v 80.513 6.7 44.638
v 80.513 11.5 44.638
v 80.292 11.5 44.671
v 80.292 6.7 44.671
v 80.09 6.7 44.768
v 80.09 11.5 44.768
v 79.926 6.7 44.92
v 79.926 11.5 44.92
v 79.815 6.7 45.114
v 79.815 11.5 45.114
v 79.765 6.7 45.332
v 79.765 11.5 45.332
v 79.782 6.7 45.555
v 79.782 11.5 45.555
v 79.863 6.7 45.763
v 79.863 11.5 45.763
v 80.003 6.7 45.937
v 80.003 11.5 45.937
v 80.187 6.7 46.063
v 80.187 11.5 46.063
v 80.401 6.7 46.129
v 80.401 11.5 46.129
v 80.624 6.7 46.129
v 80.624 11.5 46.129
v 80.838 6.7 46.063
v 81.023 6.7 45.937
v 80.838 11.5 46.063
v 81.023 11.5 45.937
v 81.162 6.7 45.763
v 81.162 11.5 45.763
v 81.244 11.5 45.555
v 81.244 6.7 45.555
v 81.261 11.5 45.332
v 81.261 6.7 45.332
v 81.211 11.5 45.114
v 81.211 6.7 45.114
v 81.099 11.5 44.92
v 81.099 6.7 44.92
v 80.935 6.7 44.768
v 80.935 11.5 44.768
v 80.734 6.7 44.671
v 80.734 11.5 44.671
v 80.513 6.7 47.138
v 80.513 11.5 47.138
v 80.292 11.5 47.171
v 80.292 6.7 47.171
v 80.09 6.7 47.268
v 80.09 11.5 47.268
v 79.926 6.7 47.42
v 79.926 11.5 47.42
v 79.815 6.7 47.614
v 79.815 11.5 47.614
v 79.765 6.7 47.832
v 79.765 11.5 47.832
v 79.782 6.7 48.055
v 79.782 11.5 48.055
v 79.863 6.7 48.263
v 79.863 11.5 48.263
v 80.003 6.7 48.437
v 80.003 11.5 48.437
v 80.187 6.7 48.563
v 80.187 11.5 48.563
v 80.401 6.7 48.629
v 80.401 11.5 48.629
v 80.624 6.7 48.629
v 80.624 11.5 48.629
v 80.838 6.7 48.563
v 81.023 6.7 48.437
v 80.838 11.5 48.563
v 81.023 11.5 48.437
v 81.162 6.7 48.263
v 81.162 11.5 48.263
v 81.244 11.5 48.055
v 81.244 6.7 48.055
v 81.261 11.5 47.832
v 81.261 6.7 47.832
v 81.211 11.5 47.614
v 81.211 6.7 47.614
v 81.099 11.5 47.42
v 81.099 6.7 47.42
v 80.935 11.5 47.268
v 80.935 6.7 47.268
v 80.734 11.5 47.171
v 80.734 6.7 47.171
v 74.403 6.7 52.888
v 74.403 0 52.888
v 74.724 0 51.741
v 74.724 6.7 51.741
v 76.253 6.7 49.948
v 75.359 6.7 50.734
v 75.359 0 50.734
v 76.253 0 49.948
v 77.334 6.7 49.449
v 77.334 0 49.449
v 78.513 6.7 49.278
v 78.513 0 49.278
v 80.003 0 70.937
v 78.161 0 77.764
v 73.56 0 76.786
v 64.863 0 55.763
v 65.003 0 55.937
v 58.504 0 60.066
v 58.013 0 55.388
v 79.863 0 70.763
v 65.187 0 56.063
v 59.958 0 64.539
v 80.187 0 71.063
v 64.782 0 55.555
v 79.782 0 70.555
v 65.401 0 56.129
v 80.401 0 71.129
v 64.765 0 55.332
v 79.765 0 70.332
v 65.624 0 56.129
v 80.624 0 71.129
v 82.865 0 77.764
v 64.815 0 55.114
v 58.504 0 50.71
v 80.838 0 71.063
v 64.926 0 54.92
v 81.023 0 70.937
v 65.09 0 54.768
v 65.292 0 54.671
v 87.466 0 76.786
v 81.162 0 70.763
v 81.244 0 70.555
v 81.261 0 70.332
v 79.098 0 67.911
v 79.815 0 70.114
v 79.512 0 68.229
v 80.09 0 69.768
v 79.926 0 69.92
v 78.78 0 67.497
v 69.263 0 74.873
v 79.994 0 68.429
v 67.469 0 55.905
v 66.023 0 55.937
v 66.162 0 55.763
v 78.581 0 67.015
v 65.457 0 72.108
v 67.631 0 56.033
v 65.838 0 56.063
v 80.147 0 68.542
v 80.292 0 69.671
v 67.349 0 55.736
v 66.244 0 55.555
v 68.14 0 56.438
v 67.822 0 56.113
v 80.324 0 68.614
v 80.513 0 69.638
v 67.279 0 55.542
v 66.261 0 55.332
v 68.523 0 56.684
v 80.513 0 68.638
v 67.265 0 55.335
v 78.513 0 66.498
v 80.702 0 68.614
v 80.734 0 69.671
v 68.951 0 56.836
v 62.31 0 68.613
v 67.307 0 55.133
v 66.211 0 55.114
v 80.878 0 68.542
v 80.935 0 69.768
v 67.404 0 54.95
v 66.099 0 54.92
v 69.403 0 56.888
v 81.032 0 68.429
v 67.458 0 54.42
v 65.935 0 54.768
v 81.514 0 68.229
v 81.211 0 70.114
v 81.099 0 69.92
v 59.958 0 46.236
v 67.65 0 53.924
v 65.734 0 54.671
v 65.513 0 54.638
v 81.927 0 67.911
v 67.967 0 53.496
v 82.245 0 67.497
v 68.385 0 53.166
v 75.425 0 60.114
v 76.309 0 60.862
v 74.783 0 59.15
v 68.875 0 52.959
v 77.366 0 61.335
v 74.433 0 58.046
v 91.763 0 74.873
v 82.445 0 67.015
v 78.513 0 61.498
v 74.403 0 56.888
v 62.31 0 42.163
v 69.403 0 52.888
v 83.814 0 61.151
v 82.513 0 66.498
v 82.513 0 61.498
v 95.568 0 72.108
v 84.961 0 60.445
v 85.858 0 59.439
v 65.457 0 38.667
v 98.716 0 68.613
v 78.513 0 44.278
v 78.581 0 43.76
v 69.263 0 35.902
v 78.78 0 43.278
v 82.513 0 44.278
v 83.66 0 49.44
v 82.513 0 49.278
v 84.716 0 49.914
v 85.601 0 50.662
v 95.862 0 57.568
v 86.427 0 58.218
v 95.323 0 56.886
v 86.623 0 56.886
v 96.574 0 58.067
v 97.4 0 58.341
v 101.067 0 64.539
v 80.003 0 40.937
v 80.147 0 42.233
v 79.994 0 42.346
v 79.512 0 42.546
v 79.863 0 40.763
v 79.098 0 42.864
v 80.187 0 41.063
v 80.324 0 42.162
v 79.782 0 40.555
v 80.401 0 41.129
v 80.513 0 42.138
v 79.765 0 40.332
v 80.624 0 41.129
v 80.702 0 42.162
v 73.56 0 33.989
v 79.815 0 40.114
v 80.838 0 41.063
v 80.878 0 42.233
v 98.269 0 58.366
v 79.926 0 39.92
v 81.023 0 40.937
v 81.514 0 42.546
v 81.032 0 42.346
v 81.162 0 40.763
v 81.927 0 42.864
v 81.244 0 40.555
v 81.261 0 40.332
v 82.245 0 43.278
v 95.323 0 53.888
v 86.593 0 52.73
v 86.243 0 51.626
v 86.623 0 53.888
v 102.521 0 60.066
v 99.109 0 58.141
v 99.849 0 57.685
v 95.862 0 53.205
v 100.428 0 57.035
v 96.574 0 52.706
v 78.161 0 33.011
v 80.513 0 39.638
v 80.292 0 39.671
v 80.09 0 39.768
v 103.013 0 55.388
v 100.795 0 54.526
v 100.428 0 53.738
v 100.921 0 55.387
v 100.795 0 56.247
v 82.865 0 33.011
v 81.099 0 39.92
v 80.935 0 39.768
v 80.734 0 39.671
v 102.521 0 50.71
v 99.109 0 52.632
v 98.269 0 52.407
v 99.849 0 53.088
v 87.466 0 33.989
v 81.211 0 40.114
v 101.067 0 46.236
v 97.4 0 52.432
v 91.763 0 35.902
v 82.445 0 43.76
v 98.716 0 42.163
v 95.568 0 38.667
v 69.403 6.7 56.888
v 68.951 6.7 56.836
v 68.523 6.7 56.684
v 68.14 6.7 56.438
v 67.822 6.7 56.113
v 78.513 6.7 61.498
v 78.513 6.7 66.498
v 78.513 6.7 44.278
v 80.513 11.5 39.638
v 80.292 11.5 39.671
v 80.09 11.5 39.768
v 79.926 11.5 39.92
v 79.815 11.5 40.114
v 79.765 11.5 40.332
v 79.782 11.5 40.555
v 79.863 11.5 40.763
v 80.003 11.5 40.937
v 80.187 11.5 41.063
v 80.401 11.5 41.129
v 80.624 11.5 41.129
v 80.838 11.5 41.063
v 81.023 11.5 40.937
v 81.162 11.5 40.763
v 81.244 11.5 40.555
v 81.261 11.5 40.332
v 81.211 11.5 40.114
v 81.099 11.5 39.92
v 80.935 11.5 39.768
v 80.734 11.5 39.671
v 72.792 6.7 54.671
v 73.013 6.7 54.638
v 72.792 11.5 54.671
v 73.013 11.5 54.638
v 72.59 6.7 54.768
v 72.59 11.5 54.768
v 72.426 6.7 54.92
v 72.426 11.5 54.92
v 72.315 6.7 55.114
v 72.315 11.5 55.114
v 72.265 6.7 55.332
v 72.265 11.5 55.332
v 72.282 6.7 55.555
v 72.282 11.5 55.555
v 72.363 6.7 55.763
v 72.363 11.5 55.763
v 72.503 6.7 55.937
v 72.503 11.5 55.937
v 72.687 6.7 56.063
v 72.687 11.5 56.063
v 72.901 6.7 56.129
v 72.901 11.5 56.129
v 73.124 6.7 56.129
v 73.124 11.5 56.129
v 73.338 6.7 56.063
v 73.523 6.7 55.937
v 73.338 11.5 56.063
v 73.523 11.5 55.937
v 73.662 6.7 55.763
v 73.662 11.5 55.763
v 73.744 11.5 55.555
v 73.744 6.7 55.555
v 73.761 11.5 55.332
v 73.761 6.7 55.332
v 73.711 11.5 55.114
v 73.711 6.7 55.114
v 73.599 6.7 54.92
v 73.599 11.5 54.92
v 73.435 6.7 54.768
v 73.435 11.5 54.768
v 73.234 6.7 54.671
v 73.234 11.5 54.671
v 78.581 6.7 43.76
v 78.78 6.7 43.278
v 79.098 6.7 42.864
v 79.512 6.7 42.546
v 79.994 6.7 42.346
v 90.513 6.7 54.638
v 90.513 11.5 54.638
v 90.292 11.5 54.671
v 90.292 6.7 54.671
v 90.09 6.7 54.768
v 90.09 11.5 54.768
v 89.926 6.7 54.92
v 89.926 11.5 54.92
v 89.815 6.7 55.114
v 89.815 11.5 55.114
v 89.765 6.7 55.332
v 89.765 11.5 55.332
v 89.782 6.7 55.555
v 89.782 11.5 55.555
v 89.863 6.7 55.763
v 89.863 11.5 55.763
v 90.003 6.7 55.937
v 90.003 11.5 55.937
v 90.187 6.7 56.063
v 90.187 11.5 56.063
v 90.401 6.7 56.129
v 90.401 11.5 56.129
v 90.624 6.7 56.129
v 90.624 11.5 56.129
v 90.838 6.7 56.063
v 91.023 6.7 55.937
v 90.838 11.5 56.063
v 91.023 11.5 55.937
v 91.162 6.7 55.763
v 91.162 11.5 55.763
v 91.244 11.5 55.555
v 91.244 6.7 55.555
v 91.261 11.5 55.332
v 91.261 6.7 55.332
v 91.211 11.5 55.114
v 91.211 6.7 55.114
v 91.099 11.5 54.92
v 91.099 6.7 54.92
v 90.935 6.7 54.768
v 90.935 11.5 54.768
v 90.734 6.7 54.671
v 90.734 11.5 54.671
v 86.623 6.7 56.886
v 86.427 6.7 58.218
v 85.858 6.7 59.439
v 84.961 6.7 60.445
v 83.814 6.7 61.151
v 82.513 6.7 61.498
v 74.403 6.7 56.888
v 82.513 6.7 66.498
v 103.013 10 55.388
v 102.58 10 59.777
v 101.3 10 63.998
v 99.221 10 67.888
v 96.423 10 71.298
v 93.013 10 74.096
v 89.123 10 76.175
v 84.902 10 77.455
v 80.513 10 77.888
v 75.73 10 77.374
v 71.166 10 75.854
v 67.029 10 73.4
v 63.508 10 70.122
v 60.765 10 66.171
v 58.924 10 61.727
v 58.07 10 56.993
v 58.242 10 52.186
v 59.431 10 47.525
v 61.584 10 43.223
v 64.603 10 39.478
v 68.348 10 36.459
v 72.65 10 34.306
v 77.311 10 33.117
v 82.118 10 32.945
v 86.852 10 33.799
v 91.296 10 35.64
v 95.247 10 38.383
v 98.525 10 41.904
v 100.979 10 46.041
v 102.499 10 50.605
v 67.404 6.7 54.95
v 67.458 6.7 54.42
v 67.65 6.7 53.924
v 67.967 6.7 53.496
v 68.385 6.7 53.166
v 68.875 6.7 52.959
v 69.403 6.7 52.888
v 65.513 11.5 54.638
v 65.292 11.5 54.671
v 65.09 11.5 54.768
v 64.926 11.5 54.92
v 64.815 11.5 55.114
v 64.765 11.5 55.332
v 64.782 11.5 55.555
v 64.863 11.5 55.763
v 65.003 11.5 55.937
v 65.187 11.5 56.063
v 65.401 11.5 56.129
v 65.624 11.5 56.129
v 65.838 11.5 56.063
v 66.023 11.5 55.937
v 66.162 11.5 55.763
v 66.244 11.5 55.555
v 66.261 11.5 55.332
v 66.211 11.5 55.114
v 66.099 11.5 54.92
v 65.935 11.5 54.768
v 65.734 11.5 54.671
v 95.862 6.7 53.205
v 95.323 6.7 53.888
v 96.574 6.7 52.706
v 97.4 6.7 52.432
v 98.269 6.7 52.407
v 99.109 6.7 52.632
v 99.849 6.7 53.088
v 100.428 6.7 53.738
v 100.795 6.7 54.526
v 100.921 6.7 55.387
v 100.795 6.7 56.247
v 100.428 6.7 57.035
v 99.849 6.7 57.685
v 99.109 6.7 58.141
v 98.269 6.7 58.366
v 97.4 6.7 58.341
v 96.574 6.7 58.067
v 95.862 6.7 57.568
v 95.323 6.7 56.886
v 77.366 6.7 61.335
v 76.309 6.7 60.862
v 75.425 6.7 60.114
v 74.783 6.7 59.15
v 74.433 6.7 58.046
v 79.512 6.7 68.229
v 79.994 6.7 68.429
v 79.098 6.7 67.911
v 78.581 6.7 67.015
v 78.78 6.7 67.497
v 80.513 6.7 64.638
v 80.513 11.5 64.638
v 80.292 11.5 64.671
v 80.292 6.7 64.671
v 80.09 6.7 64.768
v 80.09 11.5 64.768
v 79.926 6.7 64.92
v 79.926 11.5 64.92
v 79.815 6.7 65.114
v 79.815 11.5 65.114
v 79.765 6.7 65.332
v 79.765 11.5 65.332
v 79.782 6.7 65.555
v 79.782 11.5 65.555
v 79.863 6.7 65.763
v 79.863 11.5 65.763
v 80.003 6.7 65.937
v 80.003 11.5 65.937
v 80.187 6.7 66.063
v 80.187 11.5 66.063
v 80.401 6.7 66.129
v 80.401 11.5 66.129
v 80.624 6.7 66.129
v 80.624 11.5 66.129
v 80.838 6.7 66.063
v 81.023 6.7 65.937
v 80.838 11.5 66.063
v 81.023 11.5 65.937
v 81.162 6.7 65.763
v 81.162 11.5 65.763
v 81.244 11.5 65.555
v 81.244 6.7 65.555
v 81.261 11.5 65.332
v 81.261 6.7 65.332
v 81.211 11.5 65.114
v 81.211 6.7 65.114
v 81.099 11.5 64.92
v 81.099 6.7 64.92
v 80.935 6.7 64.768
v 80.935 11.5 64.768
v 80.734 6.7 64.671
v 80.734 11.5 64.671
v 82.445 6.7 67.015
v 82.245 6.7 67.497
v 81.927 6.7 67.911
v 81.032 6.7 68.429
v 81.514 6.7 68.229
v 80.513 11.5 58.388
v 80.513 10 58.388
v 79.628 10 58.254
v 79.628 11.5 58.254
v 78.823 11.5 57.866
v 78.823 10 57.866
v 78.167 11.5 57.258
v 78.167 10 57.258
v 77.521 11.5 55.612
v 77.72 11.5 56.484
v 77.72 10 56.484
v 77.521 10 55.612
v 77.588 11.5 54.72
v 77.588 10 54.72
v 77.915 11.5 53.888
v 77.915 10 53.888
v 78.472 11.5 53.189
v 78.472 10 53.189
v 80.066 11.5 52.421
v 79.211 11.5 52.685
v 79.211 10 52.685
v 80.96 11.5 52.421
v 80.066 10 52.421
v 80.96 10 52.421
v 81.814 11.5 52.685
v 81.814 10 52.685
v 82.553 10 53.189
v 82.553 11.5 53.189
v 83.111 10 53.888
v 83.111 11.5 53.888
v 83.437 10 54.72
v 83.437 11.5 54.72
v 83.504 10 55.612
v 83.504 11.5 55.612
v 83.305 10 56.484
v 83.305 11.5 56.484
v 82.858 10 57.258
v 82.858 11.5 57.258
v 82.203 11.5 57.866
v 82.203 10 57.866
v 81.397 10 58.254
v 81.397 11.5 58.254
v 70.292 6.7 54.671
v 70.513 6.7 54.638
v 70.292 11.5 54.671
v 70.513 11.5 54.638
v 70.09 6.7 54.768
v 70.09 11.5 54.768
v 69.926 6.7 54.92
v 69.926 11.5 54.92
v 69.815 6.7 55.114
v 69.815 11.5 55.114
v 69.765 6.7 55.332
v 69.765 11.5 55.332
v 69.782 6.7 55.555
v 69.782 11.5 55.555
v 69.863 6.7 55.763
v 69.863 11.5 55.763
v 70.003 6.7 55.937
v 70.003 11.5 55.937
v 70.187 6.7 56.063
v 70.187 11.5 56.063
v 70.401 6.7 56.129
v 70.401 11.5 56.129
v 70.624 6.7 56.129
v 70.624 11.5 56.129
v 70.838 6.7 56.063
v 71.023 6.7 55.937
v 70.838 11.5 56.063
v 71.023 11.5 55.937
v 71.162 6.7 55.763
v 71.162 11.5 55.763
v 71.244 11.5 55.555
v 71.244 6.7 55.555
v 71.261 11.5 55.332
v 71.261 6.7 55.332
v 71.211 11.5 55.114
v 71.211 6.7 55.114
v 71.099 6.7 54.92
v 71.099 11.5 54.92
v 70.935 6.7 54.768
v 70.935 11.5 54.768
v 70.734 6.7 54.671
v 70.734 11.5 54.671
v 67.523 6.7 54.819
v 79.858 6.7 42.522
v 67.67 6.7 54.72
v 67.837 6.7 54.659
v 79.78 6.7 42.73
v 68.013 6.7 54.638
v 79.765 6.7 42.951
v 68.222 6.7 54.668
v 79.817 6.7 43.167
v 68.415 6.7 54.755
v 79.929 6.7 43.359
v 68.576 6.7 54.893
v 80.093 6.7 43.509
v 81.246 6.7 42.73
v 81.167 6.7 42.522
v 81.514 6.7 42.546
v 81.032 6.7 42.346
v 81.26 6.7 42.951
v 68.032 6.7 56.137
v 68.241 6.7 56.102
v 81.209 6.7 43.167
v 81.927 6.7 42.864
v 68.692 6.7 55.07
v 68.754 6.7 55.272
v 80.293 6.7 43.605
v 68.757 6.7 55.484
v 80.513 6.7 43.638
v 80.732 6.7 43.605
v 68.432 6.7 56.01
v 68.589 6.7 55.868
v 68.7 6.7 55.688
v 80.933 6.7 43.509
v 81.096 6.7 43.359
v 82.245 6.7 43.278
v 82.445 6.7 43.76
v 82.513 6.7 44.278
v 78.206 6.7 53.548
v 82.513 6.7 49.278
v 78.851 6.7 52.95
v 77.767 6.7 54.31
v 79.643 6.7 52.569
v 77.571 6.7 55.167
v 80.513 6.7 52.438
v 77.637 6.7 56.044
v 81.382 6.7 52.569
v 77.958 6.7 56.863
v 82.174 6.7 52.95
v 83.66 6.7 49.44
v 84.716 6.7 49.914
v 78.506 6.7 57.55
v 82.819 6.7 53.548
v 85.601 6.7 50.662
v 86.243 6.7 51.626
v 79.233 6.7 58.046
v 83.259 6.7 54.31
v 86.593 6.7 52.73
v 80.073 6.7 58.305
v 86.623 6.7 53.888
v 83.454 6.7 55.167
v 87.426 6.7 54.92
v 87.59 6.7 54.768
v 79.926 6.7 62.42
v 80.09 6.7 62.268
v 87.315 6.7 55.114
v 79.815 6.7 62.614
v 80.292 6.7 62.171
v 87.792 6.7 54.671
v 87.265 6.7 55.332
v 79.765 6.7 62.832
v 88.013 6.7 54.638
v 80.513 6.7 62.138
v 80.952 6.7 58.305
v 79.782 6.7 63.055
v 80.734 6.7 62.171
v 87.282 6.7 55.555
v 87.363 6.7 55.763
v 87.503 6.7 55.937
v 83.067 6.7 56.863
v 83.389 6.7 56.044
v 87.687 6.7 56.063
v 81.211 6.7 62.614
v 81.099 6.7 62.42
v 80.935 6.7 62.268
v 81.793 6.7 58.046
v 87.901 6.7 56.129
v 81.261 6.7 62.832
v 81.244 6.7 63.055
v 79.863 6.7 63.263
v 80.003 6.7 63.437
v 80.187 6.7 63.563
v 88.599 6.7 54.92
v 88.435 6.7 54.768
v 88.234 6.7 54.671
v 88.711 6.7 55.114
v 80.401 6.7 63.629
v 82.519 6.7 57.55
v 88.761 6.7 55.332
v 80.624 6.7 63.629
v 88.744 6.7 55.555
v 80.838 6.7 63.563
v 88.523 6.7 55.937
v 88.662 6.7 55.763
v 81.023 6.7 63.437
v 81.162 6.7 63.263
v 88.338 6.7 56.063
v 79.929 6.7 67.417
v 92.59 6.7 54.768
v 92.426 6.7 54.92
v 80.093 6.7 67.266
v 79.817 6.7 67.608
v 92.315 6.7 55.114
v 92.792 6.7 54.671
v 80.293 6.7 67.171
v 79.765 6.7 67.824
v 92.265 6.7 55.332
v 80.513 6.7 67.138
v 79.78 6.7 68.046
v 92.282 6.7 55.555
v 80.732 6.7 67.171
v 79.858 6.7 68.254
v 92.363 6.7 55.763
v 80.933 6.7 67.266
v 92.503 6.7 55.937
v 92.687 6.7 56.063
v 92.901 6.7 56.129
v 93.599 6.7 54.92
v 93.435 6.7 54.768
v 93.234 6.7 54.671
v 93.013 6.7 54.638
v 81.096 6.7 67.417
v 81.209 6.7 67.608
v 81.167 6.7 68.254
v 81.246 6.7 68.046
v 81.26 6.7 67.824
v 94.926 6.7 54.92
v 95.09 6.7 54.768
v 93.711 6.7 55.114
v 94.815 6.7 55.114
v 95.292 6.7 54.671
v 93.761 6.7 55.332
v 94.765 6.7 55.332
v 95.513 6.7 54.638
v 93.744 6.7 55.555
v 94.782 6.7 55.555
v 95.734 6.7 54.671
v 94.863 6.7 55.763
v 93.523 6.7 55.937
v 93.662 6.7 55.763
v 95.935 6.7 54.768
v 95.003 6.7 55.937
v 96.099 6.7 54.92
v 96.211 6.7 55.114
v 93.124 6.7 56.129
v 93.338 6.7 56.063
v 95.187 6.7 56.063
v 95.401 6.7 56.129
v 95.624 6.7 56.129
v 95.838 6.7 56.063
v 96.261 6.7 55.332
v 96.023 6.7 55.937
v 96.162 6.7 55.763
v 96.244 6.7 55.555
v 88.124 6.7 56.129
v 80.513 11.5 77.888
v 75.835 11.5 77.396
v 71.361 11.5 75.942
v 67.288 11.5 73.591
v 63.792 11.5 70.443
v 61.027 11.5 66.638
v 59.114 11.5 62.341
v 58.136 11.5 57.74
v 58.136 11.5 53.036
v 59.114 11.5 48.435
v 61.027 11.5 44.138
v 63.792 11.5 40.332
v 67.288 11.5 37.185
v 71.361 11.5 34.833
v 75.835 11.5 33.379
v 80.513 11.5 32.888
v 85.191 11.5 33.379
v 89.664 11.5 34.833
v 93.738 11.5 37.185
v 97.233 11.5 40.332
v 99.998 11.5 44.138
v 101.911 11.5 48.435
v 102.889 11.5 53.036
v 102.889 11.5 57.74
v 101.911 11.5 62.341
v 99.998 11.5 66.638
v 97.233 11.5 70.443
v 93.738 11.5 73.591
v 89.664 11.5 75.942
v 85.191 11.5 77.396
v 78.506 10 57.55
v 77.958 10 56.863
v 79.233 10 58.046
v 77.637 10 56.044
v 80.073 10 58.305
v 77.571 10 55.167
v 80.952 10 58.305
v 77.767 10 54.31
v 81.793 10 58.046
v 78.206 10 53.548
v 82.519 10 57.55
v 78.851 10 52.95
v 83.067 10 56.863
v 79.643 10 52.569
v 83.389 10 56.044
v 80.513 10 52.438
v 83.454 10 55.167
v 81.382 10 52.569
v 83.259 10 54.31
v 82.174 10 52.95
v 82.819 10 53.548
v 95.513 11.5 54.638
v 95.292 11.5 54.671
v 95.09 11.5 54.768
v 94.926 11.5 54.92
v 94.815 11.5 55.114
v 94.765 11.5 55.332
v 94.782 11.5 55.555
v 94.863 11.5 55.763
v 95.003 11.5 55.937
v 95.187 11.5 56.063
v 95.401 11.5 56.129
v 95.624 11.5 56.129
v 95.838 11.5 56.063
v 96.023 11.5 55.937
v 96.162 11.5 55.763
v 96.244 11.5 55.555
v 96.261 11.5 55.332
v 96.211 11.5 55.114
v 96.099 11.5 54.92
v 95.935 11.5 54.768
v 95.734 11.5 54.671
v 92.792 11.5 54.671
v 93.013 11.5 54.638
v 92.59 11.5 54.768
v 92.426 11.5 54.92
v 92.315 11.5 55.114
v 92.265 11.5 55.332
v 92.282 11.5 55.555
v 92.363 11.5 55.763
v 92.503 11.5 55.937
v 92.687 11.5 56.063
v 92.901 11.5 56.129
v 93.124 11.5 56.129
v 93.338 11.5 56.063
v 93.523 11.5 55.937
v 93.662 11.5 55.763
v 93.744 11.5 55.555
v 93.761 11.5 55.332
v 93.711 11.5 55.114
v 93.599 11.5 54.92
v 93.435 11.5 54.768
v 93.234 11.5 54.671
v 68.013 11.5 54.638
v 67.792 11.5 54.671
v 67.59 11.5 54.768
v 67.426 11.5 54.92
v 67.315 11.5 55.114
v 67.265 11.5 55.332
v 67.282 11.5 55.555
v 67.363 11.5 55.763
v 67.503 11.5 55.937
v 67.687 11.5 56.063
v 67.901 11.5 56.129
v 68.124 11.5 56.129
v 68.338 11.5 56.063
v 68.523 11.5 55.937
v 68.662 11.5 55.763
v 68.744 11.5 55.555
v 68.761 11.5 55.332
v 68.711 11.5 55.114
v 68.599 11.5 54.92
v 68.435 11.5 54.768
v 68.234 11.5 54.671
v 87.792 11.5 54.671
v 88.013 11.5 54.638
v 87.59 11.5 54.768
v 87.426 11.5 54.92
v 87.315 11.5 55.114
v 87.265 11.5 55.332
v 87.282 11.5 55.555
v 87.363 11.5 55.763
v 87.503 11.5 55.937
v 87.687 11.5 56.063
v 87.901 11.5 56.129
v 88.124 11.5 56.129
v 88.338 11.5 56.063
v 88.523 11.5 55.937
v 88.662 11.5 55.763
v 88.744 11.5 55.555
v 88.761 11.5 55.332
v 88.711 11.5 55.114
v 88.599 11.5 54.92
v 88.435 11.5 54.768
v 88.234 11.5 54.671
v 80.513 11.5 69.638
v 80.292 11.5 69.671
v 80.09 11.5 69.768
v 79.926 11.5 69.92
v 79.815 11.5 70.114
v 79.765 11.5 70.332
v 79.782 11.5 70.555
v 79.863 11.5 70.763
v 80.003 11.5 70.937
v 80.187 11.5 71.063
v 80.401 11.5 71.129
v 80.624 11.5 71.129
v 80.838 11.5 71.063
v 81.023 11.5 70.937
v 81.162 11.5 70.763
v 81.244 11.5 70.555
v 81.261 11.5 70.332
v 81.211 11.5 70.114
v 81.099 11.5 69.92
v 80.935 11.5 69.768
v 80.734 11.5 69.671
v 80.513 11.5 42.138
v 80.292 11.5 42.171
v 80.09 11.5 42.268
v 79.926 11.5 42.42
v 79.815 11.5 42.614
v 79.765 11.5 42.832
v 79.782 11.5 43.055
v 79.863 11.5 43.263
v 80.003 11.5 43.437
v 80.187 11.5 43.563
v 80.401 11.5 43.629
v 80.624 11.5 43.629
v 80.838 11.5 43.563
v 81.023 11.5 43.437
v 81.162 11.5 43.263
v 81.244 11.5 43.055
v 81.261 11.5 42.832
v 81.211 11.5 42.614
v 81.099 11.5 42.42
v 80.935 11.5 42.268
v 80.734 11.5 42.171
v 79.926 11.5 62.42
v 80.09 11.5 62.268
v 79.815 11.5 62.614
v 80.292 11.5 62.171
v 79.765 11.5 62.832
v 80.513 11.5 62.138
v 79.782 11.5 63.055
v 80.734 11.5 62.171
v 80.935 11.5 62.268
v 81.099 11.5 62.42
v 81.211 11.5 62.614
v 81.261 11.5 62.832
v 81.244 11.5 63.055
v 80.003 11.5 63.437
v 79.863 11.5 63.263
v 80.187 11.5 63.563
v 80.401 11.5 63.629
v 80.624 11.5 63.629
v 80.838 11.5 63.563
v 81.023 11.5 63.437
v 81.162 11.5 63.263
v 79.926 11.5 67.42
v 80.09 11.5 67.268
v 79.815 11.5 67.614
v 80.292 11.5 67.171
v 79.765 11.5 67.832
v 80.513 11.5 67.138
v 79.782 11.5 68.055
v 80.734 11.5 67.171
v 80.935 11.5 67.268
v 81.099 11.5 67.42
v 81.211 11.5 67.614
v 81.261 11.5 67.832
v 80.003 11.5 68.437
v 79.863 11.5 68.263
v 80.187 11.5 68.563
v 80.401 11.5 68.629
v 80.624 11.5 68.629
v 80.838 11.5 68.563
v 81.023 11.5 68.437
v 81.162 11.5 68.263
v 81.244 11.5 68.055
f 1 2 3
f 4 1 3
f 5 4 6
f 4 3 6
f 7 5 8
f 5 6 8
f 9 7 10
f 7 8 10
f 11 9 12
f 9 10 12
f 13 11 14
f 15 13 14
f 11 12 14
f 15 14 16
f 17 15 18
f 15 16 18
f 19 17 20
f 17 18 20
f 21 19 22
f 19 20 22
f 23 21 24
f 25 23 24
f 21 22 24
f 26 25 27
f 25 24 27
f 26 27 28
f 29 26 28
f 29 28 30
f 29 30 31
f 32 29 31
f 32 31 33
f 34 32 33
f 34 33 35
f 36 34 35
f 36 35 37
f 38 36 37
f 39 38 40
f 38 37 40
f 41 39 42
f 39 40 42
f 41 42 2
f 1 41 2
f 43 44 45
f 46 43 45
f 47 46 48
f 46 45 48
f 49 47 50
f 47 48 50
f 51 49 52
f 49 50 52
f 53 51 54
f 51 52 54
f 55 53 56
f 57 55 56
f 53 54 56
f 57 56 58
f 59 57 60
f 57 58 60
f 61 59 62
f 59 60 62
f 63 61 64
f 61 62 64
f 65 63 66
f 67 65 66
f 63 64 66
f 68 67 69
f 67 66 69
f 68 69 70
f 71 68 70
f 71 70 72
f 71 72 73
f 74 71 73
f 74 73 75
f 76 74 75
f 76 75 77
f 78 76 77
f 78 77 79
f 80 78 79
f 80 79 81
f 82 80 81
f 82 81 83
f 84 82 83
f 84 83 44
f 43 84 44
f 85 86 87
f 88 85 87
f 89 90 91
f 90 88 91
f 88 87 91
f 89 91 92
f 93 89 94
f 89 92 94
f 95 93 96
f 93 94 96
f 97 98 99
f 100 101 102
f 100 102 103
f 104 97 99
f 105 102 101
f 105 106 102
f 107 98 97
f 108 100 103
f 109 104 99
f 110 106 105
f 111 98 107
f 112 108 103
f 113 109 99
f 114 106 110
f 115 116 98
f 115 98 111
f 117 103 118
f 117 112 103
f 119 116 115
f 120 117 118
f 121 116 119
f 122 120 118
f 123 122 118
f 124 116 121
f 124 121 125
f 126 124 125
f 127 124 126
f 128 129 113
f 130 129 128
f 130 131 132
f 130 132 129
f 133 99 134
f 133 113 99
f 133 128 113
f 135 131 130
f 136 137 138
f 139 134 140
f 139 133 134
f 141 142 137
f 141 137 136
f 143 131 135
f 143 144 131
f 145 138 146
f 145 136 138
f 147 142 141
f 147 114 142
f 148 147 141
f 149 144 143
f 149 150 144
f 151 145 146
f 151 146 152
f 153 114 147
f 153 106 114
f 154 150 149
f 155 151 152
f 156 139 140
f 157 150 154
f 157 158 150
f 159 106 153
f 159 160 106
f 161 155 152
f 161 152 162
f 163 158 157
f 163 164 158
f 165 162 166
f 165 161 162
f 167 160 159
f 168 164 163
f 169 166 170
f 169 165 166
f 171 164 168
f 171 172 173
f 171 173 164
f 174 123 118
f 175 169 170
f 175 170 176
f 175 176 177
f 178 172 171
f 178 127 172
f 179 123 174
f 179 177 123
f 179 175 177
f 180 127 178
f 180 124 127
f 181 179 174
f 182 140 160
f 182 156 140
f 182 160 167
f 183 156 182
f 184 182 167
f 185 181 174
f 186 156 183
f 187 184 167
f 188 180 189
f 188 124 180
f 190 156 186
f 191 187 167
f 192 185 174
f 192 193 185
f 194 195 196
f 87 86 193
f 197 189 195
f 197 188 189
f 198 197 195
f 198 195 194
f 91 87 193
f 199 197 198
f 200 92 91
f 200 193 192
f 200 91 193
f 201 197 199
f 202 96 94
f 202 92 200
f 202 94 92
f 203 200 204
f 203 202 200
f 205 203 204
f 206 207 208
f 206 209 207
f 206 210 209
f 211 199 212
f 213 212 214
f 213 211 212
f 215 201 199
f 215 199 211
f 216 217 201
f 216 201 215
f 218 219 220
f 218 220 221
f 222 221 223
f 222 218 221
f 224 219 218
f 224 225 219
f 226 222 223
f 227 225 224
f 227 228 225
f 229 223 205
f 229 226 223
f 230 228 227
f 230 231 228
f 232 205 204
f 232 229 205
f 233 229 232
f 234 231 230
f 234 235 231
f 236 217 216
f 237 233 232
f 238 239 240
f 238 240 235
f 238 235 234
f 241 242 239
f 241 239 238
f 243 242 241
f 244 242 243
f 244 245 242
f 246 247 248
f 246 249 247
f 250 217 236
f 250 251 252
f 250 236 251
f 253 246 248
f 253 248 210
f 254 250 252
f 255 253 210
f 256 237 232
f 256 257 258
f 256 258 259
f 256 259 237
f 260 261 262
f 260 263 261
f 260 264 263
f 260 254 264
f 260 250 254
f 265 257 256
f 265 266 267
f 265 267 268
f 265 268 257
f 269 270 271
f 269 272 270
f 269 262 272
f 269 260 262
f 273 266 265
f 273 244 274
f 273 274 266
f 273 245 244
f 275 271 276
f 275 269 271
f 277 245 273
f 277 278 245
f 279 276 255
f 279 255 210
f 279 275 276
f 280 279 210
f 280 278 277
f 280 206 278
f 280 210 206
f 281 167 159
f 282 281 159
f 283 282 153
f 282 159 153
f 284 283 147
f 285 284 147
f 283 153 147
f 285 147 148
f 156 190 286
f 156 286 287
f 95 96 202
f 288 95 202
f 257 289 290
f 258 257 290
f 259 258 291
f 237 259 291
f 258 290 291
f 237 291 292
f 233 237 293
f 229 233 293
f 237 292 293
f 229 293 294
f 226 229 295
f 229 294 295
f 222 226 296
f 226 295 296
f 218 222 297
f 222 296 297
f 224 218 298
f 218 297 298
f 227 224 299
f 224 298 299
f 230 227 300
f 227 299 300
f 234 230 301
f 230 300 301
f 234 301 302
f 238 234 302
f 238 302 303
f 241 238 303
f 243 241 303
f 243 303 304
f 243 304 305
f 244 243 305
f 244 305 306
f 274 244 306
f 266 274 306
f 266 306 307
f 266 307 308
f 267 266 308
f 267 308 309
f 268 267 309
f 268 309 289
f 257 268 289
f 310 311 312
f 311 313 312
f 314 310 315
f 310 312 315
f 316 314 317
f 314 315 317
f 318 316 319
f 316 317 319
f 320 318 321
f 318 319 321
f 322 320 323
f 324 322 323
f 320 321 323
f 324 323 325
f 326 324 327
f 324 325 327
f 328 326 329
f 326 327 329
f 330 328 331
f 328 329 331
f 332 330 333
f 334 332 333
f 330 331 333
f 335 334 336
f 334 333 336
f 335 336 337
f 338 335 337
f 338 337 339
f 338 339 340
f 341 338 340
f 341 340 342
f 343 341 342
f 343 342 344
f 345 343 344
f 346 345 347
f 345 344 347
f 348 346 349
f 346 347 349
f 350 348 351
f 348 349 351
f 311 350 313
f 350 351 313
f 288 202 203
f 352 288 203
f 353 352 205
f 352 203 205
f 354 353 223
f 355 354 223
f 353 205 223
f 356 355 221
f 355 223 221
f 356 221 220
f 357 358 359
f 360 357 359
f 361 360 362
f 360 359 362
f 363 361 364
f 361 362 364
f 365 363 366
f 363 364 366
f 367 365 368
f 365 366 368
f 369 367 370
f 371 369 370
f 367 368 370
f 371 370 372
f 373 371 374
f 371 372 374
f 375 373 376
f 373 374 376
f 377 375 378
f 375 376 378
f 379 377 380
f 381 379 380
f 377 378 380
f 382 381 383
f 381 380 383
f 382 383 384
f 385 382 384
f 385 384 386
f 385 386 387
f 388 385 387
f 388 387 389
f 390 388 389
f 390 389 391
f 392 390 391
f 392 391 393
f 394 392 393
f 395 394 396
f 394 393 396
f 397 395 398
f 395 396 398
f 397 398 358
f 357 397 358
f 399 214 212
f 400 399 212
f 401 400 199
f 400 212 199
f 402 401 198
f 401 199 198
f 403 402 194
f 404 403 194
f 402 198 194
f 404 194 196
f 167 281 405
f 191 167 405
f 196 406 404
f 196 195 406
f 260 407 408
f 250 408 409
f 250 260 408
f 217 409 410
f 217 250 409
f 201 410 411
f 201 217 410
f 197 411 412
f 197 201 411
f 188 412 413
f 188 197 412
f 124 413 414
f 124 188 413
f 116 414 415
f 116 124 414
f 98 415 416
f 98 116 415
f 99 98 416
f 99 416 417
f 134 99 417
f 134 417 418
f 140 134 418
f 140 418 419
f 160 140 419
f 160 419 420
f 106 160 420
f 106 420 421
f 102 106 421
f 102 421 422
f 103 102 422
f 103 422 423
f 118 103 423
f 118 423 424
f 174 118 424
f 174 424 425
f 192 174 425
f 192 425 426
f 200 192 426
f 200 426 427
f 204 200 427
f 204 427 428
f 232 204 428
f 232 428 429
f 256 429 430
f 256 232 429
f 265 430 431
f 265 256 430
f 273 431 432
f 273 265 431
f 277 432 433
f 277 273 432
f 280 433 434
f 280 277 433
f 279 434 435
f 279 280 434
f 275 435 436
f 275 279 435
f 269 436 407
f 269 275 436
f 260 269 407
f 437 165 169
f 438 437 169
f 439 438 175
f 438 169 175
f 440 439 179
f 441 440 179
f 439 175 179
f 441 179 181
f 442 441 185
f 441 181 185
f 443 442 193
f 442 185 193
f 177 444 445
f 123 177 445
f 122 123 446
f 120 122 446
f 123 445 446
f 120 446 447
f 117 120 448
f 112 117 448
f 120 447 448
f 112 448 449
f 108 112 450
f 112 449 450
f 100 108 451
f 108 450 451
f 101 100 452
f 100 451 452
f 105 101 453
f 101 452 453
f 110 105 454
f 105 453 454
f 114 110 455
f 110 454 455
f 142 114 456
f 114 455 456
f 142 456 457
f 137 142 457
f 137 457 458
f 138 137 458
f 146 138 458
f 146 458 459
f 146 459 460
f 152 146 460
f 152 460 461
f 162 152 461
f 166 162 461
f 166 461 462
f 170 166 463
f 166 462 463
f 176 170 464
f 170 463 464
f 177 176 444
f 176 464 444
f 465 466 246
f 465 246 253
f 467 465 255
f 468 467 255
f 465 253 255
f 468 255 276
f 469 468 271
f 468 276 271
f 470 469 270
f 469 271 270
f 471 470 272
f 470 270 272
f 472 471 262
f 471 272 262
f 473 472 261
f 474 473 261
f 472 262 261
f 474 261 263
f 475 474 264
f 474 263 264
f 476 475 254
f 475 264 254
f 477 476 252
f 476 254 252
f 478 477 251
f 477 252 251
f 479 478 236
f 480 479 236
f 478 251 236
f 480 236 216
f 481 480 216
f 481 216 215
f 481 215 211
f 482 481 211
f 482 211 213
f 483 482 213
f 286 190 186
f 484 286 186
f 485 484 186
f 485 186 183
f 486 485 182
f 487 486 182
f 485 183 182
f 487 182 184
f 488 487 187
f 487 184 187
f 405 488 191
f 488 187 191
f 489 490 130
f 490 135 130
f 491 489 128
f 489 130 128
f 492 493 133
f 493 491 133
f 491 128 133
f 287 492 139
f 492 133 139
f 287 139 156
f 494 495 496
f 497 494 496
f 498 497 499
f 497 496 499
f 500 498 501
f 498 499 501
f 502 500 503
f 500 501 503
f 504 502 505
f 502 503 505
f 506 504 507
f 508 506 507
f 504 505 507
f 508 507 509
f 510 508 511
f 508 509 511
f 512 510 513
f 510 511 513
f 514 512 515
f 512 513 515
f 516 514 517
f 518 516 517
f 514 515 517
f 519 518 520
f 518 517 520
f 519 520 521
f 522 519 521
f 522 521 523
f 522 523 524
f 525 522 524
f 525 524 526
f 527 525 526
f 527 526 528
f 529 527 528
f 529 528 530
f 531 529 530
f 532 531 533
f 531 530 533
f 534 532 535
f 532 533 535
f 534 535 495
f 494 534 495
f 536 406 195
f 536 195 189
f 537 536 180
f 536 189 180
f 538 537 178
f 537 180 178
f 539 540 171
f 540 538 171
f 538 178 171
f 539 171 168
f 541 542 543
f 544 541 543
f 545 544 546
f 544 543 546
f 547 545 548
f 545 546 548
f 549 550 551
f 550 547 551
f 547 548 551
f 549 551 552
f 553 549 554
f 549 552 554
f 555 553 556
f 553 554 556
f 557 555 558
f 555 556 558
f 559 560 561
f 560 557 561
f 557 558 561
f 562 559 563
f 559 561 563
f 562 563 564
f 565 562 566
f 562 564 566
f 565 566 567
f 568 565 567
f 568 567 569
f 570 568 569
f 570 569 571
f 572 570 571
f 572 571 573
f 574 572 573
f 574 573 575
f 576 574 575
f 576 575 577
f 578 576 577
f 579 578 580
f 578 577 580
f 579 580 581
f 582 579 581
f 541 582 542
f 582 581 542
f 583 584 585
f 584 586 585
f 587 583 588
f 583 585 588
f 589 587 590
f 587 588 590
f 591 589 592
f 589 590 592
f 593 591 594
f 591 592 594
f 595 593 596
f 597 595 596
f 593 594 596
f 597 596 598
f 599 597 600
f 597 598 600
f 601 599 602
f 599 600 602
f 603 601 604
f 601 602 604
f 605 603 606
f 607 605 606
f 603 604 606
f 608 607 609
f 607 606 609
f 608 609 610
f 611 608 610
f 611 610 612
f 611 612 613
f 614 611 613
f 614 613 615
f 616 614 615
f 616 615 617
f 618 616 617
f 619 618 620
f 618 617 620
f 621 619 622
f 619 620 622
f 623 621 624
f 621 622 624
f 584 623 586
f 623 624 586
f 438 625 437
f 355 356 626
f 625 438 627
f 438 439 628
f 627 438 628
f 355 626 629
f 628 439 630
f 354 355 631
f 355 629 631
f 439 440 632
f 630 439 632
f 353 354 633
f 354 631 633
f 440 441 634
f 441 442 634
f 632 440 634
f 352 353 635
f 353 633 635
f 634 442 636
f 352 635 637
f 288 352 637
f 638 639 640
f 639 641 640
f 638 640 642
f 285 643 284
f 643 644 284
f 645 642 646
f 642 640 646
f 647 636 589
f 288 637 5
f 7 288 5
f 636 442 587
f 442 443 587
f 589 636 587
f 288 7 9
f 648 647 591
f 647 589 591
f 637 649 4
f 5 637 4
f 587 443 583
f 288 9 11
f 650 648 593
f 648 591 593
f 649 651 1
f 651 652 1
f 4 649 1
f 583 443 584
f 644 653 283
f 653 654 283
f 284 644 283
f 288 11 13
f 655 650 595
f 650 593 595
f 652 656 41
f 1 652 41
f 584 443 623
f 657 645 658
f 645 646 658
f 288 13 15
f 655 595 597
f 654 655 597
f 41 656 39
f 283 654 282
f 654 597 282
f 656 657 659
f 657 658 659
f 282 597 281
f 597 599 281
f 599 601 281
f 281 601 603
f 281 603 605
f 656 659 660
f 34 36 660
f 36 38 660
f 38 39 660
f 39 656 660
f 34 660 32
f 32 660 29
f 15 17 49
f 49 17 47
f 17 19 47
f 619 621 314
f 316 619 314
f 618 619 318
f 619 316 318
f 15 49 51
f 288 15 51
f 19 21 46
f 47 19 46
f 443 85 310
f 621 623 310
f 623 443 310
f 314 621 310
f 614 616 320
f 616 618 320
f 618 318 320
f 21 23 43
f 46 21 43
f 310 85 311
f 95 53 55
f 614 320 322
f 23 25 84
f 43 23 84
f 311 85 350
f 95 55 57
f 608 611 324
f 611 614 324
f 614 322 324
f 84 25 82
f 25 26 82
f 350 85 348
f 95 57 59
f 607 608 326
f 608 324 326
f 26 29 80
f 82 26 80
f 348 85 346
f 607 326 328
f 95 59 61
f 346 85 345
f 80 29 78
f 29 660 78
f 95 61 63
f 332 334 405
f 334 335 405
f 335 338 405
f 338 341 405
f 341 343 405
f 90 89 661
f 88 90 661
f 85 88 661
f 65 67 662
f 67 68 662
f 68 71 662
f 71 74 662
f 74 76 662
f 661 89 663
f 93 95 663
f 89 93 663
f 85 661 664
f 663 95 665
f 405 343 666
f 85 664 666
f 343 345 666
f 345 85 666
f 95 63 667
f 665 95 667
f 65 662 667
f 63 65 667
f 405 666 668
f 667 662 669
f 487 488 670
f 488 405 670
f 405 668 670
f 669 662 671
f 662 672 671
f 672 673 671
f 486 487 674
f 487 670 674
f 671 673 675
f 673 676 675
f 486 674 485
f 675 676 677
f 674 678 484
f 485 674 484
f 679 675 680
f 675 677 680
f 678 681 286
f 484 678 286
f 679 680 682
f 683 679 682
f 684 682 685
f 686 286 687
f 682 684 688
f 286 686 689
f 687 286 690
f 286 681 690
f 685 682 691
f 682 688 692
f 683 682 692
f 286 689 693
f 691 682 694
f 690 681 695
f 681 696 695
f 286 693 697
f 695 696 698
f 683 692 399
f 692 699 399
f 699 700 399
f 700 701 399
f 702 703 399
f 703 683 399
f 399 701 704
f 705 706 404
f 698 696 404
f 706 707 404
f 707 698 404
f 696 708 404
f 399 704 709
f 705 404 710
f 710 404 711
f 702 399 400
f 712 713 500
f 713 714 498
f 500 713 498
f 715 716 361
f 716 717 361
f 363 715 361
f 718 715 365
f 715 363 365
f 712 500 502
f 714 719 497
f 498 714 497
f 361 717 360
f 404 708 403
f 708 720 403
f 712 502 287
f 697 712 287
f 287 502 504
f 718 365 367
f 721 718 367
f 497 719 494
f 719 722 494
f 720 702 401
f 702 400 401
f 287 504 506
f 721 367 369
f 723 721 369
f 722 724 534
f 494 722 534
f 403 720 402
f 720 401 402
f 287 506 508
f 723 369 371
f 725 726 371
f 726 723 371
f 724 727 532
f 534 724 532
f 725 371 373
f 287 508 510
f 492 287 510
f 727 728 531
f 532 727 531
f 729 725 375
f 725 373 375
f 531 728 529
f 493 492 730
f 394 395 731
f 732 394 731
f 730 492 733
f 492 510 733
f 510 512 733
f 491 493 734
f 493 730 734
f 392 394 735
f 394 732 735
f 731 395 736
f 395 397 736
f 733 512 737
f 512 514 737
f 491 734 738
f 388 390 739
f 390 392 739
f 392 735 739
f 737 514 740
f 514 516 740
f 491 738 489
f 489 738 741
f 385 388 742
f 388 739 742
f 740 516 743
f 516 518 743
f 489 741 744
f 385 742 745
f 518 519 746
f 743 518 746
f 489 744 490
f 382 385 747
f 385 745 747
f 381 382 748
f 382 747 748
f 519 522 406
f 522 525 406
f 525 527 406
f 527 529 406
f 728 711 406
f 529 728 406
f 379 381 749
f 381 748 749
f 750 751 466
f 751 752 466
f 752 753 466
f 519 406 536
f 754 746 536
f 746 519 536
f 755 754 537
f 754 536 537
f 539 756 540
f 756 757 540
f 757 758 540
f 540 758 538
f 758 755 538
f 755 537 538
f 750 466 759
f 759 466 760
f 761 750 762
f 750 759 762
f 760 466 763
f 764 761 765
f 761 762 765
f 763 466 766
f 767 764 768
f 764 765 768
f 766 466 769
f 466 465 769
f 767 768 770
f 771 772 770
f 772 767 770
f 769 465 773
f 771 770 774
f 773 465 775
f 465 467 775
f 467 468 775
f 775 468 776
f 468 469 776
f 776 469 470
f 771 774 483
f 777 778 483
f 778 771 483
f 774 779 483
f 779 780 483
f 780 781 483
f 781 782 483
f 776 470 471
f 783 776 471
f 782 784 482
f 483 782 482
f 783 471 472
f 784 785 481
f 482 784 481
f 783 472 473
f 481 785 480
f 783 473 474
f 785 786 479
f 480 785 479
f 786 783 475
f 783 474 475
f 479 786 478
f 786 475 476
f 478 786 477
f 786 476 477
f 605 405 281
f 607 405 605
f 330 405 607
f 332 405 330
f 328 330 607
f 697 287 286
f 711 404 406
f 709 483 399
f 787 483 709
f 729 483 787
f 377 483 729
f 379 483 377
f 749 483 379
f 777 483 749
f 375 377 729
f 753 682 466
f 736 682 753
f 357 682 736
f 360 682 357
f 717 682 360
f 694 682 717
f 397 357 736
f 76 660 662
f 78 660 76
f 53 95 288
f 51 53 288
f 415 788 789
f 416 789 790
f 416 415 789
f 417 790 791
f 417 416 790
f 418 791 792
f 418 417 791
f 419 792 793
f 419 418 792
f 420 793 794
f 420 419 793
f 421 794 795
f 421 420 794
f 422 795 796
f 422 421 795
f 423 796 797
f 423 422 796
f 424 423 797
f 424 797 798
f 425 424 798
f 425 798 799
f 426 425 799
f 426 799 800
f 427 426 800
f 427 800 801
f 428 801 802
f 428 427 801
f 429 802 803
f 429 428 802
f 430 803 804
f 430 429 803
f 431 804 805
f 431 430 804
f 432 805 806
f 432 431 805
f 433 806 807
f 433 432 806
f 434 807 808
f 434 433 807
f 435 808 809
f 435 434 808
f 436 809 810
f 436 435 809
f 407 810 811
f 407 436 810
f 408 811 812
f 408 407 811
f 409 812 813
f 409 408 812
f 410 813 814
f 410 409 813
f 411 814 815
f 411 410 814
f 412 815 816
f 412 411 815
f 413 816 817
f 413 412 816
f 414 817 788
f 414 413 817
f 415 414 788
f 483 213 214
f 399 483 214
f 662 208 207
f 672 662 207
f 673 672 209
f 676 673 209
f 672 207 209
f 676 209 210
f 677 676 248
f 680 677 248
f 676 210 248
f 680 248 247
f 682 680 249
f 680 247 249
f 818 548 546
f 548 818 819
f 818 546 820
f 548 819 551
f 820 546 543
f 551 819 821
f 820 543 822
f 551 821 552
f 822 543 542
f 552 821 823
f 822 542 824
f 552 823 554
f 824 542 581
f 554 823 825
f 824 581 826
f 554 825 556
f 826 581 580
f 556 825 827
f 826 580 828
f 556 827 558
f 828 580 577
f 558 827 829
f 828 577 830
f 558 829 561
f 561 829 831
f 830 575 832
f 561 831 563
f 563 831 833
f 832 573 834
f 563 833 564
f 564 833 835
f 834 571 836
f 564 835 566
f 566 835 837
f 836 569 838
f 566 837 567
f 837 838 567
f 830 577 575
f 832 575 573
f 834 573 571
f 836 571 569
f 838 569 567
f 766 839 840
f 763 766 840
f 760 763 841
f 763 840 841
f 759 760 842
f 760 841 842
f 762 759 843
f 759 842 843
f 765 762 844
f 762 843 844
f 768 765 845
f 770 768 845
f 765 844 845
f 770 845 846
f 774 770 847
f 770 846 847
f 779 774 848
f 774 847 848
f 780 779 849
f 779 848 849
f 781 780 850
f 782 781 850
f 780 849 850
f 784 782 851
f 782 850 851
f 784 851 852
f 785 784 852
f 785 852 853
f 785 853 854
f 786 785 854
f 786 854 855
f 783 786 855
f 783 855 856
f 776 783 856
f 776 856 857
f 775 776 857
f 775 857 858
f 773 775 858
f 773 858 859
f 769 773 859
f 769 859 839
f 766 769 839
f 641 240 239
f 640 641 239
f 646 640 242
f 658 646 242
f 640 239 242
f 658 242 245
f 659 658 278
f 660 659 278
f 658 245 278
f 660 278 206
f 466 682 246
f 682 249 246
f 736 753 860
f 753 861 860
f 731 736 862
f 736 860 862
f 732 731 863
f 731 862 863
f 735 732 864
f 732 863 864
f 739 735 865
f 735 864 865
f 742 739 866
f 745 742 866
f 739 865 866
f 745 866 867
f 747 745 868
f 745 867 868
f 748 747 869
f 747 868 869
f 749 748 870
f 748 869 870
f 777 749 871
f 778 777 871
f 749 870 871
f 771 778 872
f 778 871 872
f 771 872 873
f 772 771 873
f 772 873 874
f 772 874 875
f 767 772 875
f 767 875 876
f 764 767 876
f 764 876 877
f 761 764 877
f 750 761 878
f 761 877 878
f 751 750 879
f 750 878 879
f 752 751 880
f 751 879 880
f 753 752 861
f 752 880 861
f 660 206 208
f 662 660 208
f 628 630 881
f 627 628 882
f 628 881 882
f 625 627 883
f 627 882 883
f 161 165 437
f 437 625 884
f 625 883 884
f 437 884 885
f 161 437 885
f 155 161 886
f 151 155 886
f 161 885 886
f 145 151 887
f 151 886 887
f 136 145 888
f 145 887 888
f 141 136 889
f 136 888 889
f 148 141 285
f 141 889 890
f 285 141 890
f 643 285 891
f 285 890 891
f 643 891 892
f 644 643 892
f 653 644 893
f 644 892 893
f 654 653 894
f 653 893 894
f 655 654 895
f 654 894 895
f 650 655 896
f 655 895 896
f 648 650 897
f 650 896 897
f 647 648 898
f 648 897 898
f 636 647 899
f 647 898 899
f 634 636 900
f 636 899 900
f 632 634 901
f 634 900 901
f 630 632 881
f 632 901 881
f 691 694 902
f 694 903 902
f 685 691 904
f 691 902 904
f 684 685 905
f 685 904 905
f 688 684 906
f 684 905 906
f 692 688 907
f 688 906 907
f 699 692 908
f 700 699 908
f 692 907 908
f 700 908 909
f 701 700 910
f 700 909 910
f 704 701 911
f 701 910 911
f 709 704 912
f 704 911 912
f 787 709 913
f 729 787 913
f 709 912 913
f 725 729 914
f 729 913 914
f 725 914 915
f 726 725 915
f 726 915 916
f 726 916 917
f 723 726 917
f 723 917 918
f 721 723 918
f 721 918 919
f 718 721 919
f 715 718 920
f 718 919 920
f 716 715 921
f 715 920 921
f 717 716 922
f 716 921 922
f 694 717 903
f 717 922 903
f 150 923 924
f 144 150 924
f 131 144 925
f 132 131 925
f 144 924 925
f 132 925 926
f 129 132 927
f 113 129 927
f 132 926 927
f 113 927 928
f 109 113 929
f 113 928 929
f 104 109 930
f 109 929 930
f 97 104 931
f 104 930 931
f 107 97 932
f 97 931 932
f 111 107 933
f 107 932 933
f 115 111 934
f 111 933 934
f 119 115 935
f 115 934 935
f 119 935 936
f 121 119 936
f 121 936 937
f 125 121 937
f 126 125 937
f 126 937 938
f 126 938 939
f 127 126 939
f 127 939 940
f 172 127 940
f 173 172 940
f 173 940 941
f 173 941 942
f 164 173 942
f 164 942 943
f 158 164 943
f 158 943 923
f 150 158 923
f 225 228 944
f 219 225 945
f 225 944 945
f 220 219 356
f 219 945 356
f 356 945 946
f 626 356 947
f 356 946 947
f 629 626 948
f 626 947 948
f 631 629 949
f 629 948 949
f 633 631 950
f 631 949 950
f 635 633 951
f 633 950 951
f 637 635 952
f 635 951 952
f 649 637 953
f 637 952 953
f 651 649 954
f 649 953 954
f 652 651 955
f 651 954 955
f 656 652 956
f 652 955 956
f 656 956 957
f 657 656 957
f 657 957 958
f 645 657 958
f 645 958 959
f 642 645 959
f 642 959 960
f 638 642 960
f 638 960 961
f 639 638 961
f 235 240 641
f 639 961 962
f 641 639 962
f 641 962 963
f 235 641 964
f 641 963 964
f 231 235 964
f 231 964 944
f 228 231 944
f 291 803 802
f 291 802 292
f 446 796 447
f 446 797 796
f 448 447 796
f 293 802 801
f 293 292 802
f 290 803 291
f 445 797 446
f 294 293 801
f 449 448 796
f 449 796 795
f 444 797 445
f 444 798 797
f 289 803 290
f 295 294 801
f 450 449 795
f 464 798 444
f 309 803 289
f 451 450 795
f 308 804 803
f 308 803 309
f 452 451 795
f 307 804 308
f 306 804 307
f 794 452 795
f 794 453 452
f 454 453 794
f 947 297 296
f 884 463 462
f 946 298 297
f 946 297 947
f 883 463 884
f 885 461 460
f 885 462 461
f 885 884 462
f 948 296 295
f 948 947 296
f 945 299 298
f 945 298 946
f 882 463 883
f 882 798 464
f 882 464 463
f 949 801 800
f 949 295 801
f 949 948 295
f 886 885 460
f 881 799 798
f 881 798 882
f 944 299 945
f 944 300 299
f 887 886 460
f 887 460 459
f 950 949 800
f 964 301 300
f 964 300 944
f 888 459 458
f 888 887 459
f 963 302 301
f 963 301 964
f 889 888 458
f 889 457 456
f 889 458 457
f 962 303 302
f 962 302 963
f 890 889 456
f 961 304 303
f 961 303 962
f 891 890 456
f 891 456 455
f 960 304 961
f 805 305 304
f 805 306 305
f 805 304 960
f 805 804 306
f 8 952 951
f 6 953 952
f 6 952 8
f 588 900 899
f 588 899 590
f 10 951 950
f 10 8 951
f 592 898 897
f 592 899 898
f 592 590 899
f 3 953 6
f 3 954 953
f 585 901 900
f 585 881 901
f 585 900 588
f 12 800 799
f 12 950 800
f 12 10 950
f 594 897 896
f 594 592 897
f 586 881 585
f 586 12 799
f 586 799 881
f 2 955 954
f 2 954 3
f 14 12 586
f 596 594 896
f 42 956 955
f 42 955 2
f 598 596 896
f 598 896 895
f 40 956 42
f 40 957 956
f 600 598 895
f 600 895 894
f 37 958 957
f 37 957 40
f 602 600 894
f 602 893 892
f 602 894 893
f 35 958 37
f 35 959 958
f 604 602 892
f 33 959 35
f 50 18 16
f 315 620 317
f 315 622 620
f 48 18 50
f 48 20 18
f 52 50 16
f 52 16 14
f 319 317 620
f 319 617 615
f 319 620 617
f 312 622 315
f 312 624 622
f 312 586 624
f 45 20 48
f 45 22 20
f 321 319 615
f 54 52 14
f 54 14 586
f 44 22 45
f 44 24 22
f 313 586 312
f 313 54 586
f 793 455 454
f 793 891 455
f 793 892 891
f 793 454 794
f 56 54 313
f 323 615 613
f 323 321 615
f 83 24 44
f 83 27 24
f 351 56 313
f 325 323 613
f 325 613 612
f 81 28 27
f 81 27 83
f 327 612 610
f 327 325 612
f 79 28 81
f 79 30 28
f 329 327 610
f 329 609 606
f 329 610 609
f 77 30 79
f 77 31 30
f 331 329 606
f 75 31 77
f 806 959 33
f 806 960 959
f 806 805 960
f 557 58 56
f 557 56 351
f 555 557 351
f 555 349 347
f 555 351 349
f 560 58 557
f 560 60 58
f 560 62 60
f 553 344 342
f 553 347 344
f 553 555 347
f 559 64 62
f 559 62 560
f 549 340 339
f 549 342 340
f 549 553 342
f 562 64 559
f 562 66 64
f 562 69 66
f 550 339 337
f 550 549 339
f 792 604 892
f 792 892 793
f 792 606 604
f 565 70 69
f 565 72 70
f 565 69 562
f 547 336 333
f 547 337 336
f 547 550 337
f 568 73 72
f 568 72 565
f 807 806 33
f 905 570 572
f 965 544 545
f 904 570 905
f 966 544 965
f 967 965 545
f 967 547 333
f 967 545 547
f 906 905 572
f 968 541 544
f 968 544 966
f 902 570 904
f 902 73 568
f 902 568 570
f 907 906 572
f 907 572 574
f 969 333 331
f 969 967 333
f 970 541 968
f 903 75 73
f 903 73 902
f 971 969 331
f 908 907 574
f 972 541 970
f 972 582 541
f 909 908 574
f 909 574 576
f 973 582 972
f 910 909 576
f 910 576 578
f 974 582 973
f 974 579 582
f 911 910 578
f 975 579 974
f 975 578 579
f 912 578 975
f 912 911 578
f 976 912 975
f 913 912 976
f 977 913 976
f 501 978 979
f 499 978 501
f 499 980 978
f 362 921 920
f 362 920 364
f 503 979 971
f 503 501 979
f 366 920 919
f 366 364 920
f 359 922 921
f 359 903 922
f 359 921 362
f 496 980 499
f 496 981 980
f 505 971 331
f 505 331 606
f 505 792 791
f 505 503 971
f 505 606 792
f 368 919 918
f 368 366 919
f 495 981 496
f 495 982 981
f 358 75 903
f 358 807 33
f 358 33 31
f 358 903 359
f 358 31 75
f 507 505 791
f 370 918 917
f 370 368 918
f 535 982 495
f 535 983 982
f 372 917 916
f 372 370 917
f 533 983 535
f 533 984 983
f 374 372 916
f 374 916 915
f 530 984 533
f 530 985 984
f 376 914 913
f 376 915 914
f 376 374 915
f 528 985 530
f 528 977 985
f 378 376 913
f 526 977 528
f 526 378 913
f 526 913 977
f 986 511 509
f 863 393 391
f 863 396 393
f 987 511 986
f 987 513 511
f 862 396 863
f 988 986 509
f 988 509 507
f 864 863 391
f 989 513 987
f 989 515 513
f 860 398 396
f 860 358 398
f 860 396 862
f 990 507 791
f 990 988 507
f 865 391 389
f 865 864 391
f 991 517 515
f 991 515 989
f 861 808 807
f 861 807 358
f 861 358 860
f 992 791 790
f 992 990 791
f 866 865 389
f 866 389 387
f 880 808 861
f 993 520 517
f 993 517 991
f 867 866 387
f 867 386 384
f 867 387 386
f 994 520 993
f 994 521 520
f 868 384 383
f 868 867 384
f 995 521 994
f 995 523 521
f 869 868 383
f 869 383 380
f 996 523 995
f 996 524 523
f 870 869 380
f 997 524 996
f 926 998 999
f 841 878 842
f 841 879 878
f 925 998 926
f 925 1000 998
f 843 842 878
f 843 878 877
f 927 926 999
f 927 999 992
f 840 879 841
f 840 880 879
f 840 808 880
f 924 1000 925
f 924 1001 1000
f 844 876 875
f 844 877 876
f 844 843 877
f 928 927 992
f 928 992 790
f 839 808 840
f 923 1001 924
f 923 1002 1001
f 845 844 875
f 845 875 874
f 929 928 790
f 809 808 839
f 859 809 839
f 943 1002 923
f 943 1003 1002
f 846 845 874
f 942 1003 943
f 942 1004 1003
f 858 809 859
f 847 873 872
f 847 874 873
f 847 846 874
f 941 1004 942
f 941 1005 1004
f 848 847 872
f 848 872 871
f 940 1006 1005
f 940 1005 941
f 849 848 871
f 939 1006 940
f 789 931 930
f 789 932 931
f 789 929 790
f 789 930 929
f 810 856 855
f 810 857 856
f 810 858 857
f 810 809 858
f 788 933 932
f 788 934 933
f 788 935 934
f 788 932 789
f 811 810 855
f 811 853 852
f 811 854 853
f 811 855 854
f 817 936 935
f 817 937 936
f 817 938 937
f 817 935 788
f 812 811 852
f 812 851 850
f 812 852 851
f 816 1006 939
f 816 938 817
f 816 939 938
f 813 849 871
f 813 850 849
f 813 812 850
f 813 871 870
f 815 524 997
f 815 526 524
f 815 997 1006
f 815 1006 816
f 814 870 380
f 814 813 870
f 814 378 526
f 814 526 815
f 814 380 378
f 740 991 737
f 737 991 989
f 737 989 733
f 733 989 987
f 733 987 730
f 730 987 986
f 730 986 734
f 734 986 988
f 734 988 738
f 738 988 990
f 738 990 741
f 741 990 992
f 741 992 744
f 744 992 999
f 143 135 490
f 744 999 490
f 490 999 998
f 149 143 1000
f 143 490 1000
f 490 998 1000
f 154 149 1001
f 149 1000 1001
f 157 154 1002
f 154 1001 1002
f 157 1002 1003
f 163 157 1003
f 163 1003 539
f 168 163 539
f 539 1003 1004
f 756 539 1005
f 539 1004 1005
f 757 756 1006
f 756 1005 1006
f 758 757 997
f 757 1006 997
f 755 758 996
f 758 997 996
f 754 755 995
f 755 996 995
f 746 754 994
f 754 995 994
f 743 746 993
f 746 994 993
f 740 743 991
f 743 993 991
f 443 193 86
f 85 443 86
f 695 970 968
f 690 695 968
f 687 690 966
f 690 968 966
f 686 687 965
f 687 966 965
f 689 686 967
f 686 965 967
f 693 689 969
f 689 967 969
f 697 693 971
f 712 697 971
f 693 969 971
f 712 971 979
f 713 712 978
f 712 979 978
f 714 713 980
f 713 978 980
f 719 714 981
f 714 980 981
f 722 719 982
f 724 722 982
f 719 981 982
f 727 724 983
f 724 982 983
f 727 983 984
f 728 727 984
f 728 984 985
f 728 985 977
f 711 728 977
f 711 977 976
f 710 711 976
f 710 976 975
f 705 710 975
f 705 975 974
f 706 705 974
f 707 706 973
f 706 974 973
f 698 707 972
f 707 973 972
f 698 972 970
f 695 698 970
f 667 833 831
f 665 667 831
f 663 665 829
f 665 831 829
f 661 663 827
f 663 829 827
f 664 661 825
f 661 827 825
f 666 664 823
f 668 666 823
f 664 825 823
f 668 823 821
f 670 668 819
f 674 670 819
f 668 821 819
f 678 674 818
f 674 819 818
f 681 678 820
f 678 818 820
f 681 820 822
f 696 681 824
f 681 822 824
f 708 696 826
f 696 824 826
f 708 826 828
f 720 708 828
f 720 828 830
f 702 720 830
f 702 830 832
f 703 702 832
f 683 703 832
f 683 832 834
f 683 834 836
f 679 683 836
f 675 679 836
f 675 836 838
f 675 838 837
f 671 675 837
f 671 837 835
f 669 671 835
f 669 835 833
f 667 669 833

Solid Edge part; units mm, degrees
sketch "Sketch1" plane through (0, 0, 0) normal (0, -1, 0) x (1, 0, 0)
  circle A0 centre (80.5127, 55.3877) radius 22.5
  dimension "D1" = 45
extrude "Protrusion1" add sketch "Sketch1" against normal blind 10
sketch "Sketch2" plane through (80.5127, 10, 55.3877) normal (0, 1, 0) x (0, 0, -1)
  circle A0 centre (0, 0) radius 2.95
  dimension "D1" = 5.9
extrude "ExtrudedCutout_5" cut sketch "Sketch2" against normal blind 4
sketch "Sketch3" plane through (80.5127, 6, 55.3877) normal (0, 1, 0) x (-1, 0, 0)
  circle A0 centre (0, 0) radius 1.05
  dimension "D1" = 2.1
extrude "Cutout1" cut sketch "Sketch3" against normal up to next
sketch "Sketch4" plane through (80.5127, 5, 51.1598) normal (0, -1, 0) x (1, 0, 0)
  circle A0 centre (0, 4.2279) radius 3.55
extrude "ExtrudedCutout_7" cut sketch "Sketch4" against normal blind 0.5
chamfer "Chamfer_2" distance 1.9 distance2 0.5 1 edges at (80.5127, 6, 58.3377) measured on face at (78.605, 6, 53.362)
sketch "Sketch5" plane through (80.5127, 10, 55.3877) normal (0, 1, 0) x (0, 0, 1)
  circle A0 centre (0, 0) radius 22.5
  circle A1 centre (0, 0) radius 3
  dimension "D1" = 45
extrude "ExtrudedProtrusion_4" add sketch "Sketch5" along normal blind 1.5
sketch "Sketch6" plane through (80.5127, 0, 55.3877) normal (0, -1, 0) x (0, 0, 1)
  line L0 (1.5, 11.11) -> (1.5, 6.11)
  arc A0 (6.11, 2) -> (1.5, 6.11) centre (1.9729, 2) ccw
  line L1 (6.11, 2) -> (11.11, 2)
  arc A1 (11.11, 2) -> (11.11, -2) centre (11.11, 0) cw
  line L2 (11.11, -2) -> (6.11, -2)
  arc A2 (1.4978, -6.11) -> (6.11, -2) centre (1.4978, -1.4671) ccw
  line L3 (1.4978, -14.81) -> (1.4978, -6.11)
  arc A3 (-1.5, -14.81) -> (1.4978, -14.81) centre (-0.0011, -17.4087) ccw
  line L4 (-1.5, -6.11) -> (-1.5, -14.81)
  arc A4 (-6.11, -2) -> (-1.5, -6.11) centre (-1.9729, -2) ccw
  line L5 (-11.11, -2) -> (-6.11, -2)
  arc A5 (-11.11, 2) -> (-11.11, -2) centre (-11.11, 0) ccw
  line L6 (-6.11, 2) -> (-11.11, 2)
  arc A6 (-6.11, 2) -> (-2.5, 6.11) centre (-1.9654, 2) cw
  line L7 (-2.5, 11.11) -> (-2.5, 6.11)
  arc A7 (1.5, 11.11) -> (-2.5, 11.11) centre (-0.5, 11.11) ccw
  dimension "D1" = 5
  dimension "D2" = 6.11
  dimension "D3" = 1.5
  dimension "D4" = 2
  dimension "D5" = 5
  dimension "D6" = 5
  dimension "D7" = 2
  dimension "D8" = 5
  dimension "D9" = 5
  dimension "D10" = 2
  dimension "D11" = 6.11
  dimension "D12" = 6.11
  dimension "D13" = 8.7
  dimension "D14" = 6.11
  dimension "D15" = 1.5
  dimension "D16" = 8.7
  dimension "D17" = 5
  dimension "D18" = 3
extrude "ExtrudedCutout_9" cut sketch "Sketch6" against normal blind 6.7
sketch "Sketch7" plane through (80.5127, 11.5, 55.3877) normal (0, 1, 0) x (0, 0, -1)
  circle A0 centre (7.5, 0) radius 0.75
  circle A1 centre (10, 0) radius 0.75
  circle A2 centre (12.5, 0) radius 0.75
  circle A3 centre (15, 0) radius 0.75
  circle A4 centre (-15, 0) radius 0.75
  circle A5 centre (-12.5, 0) radius 0.75
  circle A6 centre (-10, 0) radius 0.75
  circle A7 centre (-7.5, 0) radius 0.75
  circle A8 centre (0, -10) radius 0.75
  circle A9 centre (0, -12.5) radius 0.75
  circle A10 centre (0, -15) radius 0.75
  circle A11 centre (0, -7.5) radius 0.75
  circle A12 centre (0, 7.5) radius 0.75
  circle A13 centre (0, 10) radius 0.75
  circle A14 centre (0, 12.5) radius 0.75
  circle A15 centre (0, 15) radius 0.75
  dimension "D1" = 7.5
  dimension "D2" = 1.5
  dimension "D3" = 10
  dimension "D4" = 1.5
  dimension "D5" = 12.5
  dimension "D6" = 15
  dimension "D7" = 7.5
  dimension "D8" = 10
  dimension "D9" = 12.5
  dimension "D10" = 15
  dimension "D11" = 1.5
  dimension "D12" = 7.5
  dimension "D13" = 10
  dimension "D14" = 12.5
  dimension "D15" = 15
  dimension "D16" = 1.5
  dimension "D17" = 1.5
  dimension "D18" = 7.5
  dimension "D19" = 10
  dimension "D20" = 12.5
  dimension "D21" = 1.5
  dimension "D22" = 15
extrude "Cutout2" cut sketch "Sketch7" against normal through all
